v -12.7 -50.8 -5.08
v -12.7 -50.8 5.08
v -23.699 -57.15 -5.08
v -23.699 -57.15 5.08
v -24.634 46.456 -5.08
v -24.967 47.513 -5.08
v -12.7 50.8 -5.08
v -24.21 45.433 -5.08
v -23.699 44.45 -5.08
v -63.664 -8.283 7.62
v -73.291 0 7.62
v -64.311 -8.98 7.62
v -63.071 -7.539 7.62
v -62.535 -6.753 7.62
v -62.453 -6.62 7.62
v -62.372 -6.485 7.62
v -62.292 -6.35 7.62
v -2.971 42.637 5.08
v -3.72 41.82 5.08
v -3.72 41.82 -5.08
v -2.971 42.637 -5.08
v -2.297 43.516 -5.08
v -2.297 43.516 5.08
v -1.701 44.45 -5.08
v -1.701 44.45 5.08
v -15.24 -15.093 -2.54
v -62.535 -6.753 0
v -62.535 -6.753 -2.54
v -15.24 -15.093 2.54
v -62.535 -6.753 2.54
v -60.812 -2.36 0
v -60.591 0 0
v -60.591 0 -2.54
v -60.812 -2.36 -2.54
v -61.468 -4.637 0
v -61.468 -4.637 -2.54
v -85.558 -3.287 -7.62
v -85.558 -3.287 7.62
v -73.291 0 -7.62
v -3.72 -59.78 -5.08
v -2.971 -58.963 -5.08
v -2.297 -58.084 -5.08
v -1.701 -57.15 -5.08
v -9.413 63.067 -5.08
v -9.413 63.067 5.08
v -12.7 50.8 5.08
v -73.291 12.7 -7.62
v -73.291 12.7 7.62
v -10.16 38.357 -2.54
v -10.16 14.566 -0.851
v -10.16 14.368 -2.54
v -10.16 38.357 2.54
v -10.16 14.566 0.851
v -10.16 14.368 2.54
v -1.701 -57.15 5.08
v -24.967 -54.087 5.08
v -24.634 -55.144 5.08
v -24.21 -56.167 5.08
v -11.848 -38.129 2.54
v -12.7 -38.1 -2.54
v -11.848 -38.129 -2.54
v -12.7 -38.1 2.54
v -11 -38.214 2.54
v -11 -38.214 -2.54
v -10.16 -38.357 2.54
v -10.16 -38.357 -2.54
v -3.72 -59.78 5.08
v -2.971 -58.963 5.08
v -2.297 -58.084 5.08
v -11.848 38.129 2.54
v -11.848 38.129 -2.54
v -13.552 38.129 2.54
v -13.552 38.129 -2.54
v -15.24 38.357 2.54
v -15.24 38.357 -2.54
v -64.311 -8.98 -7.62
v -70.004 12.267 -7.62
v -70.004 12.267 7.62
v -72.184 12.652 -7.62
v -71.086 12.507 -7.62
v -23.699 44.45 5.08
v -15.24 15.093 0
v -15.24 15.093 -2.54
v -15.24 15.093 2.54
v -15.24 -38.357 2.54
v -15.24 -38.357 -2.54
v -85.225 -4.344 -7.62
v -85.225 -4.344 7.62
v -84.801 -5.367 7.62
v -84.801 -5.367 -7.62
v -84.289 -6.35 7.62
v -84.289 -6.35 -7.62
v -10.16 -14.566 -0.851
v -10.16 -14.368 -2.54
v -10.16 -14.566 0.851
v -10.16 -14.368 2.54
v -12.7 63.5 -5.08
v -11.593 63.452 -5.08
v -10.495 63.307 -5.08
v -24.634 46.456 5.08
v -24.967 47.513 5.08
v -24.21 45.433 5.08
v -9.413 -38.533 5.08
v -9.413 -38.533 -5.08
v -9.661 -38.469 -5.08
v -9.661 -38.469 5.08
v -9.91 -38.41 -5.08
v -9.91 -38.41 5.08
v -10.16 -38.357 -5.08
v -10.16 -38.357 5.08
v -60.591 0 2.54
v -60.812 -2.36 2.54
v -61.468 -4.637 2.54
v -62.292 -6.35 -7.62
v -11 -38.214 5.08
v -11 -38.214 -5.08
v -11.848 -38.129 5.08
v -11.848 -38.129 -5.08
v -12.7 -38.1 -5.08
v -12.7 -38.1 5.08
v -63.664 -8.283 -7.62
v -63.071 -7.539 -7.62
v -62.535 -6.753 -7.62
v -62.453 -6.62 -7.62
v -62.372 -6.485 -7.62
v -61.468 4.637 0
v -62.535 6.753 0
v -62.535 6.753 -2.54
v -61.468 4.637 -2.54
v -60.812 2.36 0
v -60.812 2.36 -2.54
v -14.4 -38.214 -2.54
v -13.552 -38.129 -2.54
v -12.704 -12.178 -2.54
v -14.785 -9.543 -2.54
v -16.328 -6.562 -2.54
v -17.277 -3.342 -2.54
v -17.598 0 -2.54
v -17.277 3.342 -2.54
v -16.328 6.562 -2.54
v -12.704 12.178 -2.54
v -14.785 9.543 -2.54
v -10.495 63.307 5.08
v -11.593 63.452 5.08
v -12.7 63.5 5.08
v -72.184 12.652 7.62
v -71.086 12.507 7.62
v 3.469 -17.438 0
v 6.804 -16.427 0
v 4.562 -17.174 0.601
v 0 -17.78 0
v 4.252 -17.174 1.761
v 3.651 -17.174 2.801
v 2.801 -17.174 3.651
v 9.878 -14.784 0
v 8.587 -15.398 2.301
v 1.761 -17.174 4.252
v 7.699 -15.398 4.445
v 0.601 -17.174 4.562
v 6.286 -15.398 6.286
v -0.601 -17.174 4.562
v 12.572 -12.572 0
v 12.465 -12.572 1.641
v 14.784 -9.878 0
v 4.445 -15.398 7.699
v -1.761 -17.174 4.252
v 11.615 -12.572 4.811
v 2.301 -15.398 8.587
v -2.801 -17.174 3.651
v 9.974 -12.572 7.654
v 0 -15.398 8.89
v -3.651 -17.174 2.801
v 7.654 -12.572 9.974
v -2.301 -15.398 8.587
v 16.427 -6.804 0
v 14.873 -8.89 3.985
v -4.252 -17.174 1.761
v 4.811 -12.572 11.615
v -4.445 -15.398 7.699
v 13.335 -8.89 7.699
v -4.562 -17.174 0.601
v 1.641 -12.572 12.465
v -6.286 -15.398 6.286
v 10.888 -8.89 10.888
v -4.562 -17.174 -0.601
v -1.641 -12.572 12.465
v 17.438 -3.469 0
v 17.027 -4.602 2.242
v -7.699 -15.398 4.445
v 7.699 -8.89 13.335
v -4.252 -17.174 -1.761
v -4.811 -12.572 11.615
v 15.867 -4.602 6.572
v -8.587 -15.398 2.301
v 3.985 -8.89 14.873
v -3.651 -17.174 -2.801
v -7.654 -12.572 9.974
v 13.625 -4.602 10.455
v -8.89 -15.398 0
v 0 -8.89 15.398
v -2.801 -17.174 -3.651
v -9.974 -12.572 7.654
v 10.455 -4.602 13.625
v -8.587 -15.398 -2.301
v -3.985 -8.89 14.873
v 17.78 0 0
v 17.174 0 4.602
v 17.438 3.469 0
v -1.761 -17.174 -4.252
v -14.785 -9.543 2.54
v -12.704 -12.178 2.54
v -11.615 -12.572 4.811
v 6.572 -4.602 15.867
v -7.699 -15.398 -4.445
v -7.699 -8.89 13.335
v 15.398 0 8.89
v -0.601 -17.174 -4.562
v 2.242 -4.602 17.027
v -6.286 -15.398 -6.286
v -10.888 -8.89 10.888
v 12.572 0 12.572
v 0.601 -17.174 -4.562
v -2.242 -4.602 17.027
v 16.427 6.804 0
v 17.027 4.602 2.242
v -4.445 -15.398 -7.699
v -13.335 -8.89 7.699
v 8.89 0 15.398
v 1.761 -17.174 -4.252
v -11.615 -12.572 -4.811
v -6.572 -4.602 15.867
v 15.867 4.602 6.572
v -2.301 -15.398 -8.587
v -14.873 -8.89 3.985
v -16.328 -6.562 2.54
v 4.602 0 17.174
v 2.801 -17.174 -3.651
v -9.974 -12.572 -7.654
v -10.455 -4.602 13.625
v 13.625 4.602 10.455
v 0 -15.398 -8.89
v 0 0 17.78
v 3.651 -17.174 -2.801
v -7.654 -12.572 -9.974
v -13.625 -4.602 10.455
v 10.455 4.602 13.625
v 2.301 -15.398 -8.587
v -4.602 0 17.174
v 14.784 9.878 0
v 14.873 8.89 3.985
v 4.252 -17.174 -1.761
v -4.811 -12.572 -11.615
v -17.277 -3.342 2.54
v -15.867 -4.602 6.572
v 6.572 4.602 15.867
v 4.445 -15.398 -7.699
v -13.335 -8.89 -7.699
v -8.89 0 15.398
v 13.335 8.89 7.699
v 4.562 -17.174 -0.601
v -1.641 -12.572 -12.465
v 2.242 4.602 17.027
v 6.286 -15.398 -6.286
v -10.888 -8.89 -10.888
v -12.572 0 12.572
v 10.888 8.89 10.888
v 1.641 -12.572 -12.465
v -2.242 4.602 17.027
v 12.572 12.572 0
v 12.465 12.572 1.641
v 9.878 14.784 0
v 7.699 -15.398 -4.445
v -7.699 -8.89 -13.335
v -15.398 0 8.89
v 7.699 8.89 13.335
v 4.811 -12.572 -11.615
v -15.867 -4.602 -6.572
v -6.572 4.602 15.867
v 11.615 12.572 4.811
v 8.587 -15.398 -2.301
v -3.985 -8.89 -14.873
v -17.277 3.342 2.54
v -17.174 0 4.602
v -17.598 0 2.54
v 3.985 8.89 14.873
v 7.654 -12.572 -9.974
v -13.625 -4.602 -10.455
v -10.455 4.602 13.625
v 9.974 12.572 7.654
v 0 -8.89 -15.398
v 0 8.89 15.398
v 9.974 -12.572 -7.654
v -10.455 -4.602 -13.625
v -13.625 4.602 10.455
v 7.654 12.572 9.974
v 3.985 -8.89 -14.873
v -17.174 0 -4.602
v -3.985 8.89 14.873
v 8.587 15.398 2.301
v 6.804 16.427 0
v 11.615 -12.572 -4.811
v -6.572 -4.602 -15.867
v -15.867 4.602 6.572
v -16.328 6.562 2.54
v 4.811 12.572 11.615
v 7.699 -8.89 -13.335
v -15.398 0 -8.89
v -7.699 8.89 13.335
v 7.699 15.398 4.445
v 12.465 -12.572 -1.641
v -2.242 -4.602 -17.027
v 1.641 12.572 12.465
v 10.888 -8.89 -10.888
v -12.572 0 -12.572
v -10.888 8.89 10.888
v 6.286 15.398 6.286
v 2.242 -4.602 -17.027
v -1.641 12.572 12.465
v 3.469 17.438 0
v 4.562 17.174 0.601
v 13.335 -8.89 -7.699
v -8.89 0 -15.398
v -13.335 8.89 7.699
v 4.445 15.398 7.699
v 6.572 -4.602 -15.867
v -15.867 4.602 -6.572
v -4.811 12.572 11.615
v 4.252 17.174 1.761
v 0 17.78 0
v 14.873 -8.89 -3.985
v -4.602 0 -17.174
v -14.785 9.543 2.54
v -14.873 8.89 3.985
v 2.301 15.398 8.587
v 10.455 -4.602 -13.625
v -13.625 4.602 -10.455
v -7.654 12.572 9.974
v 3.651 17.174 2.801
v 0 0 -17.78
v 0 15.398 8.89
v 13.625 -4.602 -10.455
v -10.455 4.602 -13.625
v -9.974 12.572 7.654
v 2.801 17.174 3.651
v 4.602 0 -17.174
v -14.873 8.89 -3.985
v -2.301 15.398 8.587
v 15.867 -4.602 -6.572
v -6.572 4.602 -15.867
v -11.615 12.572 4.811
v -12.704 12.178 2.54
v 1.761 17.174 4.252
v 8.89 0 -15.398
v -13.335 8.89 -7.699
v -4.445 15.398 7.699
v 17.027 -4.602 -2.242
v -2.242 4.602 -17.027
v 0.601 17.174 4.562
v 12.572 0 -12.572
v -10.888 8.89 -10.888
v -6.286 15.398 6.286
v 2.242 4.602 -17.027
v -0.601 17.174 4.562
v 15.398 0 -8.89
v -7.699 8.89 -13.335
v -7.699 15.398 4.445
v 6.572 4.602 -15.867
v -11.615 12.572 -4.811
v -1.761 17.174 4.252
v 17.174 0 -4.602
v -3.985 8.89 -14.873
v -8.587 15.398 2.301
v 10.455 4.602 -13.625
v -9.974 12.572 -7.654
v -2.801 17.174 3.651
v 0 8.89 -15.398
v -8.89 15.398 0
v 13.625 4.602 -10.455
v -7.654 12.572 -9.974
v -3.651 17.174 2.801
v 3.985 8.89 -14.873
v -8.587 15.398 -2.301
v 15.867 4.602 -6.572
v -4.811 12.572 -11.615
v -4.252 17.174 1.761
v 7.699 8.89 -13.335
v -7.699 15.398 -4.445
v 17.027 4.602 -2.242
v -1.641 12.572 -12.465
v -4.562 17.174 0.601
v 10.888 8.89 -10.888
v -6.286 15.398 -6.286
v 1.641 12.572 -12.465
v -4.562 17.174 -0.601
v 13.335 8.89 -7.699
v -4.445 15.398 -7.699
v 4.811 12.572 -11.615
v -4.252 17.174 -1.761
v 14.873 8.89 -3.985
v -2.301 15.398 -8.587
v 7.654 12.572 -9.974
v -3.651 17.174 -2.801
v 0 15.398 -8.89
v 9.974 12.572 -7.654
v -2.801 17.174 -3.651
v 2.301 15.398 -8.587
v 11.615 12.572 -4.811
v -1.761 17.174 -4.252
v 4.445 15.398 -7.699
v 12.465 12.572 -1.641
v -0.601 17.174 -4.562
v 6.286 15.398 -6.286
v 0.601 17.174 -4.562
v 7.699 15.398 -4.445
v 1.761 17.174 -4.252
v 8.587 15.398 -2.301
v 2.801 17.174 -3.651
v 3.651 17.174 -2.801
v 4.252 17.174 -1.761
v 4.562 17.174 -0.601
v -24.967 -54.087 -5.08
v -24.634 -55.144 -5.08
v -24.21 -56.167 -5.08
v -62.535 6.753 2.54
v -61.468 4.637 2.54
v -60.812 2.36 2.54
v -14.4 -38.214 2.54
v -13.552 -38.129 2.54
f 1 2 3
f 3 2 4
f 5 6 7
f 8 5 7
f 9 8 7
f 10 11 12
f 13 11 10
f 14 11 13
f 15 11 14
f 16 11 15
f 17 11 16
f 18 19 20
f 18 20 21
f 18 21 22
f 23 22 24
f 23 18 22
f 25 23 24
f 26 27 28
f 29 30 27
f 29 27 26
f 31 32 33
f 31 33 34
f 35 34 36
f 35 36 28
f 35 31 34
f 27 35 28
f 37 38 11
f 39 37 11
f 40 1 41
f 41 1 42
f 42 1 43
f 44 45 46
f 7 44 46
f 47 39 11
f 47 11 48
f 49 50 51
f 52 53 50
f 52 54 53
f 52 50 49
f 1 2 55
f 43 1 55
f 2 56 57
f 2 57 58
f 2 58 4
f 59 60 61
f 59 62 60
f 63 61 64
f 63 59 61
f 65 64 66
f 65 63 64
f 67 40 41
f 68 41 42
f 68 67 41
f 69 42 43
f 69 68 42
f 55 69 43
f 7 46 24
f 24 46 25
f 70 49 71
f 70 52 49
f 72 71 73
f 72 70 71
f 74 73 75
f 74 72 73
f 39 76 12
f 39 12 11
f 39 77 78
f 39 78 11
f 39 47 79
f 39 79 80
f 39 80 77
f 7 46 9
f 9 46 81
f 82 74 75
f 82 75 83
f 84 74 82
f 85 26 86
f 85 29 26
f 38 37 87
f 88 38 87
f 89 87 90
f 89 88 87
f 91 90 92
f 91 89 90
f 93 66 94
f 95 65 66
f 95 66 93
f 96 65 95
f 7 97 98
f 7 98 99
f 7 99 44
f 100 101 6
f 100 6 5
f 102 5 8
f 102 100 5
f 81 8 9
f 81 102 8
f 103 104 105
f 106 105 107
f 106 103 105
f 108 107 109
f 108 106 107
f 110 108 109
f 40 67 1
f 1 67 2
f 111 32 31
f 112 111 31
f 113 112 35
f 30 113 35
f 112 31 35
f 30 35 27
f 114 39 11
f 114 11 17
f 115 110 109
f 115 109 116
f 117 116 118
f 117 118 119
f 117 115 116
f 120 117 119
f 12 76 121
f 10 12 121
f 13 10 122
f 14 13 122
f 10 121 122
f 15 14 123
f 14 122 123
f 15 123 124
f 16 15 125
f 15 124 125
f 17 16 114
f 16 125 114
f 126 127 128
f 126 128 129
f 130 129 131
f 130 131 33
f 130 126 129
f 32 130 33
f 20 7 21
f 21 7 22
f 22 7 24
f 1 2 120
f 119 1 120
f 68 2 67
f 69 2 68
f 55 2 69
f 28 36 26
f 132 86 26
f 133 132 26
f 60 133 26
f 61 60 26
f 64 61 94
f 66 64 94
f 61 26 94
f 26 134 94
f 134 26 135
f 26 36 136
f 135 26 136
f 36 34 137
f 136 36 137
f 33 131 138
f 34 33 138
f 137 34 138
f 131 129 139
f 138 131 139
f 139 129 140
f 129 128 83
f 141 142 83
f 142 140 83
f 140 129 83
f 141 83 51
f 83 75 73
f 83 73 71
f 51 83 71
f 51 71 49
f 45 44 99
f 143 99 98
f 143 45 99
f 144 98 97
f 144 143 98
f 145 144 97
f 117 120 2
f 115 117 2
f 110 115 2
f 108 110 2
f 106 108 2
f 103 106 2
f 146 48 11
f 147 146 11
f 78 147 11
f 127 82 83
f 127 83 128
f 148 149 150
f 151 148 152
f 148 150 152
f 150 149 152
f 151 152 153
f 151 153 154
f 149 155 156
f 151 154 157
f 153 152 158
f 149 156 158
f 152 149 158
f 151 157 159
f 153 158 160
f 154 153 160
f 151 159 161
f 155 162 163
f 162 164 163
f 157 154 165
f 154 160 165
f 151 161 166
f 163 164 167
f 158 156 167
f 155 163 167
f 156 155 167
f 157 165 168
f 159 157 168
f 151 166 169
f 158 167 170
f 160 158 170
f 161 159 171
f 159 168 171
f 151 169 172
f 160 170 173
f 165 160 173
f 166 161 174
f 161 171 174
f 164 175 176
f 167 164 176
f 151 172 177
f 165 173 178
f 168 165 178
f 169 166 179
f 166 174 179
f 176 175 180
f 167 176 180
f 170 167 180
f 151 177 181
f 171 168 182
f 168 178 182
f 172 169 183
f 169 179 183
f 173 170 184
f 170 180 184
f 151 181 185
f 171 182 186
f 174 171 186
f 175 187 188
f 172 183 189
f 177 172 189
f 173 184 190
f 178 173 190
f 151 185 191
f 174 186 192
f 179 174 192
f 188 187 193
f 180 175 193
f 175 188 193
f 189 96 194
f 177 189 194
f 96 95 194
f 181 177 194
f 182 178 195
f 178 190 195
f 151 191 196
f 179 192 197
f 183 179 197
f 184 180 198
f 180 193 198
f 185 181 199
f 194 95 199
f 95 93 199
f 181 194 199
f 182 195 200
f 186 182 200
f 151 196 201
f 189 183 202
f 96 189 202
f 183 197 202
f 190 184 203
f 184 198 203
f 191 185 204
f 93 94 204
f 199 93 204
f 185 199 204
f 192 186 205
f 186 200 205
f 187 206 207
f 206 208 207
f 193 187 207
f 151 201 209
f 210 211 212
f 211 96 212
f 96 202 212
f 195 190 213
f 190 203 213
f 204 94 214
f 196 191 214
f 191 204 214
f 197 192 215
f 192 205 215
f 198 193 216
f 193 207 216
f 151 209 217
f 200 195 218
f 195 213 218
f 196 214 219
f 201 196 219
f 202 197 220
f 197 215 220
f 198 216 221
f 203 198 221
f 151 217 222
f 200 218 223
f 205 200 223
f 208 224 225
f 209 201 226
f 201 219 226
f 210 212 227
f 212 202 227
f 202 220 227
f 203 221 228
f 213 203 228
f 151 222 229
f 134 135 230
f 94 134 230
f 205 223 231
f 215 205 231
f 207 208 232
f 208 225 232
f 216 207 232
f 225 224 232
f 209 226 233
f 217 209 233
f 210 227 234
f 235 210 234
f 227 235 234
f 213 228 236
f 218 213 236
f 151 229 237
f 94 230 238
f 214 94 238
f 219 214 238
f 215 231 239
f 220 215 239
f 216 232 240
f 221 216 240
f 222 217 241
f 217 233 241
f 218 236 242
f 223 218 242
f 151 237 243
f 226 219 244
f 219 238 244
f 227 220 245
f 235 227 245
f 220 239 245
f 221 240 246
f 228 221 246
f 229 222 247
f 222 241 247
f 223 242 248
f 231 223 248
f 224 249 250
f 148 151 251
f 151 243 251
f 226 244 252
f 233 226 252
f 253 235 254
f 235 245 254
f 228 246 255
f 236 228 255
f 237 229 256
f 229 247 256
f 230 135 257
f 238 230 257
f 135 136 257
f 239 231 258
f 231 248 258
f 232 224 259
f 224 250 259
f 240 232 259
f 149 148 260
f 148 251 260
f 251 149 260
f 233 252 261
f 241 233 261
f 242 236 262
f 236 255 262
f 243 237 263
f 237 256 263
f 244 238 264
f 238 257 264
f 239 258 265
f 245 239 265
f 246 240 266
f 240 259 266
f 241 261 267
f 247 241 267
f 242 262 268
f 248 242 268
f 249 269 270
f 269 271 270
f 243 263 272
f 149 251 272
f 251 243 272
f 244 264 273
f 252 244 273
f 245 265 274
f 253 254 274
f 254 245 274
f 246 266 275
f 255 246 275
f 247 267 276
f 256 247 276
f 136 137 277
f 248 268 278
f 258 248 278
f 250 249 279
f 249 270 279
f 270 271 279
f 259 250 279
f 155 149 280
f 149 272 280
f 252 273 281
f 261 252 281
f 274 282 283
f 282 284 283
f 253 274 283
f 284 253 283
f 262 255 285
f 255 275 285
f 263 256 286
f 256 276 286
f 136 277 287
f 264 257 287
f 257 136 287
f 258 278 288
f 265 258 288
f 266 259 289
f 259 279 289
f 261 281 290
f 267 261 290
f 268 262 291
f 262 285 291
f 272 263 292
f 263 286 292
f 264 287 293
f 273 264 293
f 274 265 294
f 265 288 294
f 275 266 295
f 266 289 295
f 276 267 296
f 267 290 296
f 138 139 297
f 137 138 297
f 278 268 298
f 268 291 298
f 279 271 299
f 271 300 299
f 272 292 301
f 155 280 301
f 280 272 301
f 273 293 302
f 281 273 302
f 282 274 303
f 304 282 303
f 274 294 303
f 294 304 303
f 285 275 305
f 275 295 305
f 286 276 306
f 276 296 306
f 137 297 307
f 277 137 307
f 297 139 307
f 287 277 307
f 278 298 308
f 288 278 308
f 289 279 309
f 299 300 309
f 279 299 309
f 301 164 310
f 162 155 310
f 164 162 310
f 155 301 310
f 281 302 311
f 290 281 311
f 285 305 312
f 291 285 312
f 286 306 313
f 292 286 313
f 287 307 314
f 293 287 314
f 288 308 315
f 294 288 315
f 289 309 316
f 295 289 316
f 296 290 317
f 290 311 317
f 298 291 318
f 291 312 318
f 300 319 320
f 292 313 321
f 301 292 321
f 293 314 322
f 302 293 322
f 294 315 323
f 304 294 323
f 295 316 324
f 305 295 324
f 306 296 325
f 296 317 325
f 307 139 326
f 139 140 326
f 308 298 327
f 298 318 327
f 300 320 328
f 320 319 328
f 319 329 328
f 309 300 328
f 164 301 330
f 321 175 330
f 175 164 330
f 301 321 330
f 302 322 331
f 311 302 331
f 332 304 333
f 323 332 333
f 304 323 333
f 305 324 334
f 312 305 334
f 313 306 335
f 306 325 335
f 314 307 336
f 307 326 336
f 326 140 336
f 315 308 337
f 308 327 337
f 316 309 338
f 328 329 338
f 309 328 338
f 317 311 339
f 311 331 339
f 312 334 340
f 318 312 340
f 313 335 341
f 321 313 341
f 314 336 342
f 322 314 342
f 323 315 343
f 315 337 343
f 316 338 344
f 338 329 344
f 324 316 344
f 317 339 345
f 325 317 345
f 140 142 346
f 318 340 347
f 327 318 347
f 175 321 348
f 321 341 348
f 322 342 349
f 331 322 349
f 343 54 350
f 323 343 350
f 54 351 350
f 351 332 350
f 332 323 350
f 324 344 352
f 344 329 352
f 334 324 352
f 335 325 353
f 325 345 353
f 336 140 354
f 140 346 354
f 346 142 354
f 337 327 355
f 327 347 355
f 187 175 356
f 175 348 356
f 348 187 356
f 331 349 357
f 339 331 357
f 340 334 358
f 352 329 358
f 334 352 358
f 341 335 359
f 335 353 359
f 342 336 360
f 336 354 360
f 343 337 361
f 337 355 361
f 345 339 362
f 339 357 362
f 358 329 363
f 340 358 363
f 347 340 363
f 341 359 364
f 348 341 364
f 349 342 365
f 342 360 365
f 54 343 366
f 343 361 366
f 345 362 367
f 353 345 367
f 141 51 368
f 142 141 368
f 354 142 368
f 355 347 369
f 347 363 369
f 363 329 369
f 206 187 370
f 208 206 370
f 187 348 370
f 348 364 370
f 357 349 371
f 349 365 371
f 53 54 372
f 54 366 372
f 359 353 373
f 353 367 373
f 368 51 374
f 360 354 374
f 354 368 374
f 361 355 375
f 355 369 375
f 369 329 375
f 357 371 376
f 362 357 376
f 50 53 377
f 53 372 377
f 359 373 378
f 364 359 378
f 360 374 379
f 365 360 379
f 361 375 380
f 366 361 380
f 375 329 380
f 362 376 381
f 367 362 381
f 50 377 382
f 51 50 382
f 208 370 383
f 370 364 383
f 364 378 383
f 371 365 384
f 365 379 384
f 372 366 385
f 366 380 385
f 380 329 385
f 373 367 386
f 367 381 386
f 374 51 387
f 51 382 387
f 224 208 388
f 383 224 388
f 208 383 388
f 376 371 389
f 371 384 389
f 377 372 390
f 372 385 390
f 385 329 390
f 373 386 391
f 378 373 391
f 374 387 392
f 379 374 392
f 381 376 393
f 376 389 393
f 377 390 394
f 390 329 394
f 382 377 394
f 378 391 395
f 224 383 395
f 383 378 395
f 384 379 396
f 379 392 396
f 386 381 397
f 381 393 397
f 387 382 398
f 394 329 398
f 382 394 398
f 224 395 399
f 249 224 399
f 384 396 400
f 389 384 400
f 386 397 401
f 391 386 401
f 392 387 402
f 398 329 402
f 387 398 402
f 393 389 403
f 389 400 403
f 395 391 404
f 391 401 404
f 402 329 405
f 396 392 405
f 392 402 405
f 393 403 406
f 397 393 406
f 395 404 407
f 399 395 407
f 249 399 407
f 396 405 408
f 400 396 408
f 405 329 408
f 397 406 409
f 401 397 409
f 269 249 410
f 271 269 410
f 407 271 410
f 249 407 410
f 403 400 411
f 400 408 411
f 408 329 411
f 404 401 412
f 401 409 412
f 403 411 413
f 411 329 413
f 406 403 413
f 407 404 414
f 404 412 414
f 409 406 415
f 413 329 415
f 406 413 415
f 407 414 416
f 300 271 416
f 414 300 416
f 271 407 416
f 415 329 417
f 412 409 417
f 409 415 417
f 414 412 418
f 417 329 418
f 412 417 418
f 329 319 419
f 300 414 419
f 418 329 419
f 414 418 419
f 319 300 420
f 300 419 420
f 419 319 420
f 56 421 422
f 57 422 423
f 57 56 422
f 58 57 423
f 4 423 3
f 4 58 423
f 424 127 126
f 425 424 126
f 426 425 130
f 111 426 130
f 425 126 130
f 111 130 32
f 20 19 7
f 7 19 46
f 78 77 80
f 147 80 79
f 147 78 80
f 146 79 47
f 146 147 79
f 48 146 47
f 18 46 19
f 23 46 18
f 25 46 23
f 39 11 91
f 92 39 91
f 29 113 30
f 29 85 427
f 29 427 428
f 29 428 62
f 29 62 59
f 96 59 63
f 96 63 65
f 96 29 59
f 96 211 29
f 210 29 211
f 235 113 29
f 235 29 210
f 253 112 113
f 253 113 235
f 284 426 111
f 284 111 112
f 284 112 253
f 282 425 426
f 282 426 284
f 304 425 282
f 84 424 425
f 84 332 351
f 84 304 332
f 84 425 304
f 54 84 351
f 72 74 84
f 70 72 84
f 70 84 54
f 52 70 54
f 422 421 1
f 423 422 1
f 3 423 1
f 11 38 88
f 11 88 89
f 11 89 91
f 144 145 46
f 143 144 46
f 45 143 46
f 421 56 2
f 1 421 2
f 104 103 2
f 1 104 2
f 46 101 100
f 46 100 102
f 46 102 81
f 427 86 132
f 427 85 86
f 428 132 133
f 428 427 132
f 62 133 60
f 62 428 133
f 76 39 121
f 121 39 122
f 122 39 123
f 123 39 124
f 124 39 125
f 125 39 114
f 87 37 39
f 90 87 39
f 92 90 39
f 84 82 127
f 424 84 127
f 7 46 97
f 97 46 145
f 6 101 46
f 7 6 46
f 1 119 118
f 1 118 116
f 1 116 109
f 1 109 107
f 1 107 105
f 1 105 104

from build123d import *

# Parameters (mm, degrees)
F2_DEPTH  = 2.54
F3_DEPTH  = 5.08
F4_DEPTH  = 7.62
F8_DEPTH  = 25.4
F10_DEPTH = 22.861
F12_DEPTH = 25.401


# Not quite as in the source:
# - the program builds the solid bodies; features that only make, move or delete a surface that nothing else refers to are left out


with BuildPart() as f1:
    # F0 (on Top) → F1 (revolve)
    with BuildSketch(Plane.XY):
        with BuildLine():
            Line((0, 0), (0, -17.78))
            ThreePointArc((0, -17.78), (17.78, 0), (0, 17.78))
            Line((0, 17.78), (0, 0))
        make_face()
    revolve(axis=Axis((0, -8.89, 0), (0, -1, 0)))

    # F0 (on Top) → F2 (join, symmetric)
    with BuildSketch(Plane.XY):
        with BuildLine():
            Line((-15.24, 15.092776814), (-10.16, 15.988517876))
            Line((-10.16, 15.988517876), (-10.16, 38.3565921067))
            ThreePointArc((-10.16, 38.3565921067), (-12.7, 38.1), (-15.24, 38.3565921067))
            Line((-15.24, 38.3565921067), (-15.24, 15.092776814))
        make_face()
        Polygon((-15.24, -15.092776814), (-10.16, -15.988517876), (-10.16, 0), (-10.16, 15.988517876), (-15.24, 15.092776814), (-15.24, 0), align=None)
        with BuildLine():
            Line((-62.5352923163, -6.7533407181), (-15.24, -15.092776814))
            Line((-15.24, -15.092776814), (-15.24, 0))
            Line((-15.24, 0), (-15.24, 15.092776814))
            Line((-15.24, 15.092776814), (-62.5352923163, 6.7533407181))
            ThreePointArc((-62.5352923163, 6.7533407181), (-61.086650628, 3.5138440574), (-60.5908671101, 0))
            ThreePointArc((-60.5908671101, 0), (-61.086650628, -3.5138440574), (-62.5352923163, -6.7533407181))
        make_face()
        with BuildLine():
            Line((-10.16, -38.3565921067), (-10.16, -15.988517876))
            Line((-10.16, -15.988517876), (-15.24, -15.092776814))
            Line((-15.24, -15.092776814), (-15.24, -38.3565921067))
            ThreePointArc((-15.24, -38.3565921067), (-13.9764638175, -38.1643108568), (-12.7, -38.1))
            ThreePointArc((-12.7, -38.1), (-11.4235361825, -38.1643108568), (-10.16, -38.3565921067))
        make_face()
    extrude(amount=F2_DEPTH, both=True)


with BuildPart() as f3:
    # F0 (on Top) → F3 (new body, symmetric)
    with BuildSketch(Plane.XY):
        with BuildLine():
            Line((-10.16, 47.2073256969), (-10.16, 38.3565921067))
            ThreePointArc((-10.16, 38.3565921067), (-2.8626223006, 42.7678147432), (0, 50.8))
            ThreePointArc((0, 50.8), (-20.7321852568, 60.6373776994), (-15.24, 38.3565921067))
            Line((-15.24, 38.3565921067), (-15.24, 46.6368459165))
            Line((-15.24, 46.6368459165), (-10.16, 47.2073256969))
        make_face()
        with BuildLine():
            ThreePointArc((-15.24, 38.3565921067), (-12.7, 38.1), (-10.16, 38.3565921067))
            Line((-10.16, 38.3565921067), (-10.16, 47.2073256969))
            Line((-10.16, 47.2073256969), (-15.24, 46.6368459165))
            Line((-15.24, 46.6368459165), (-15.24, 38.3565921067))
        make_face()
    extrude(amount=F3_DEPTH, both=True)

    # F7 (on face) → F8 (cut)
    with BuildSketch(Plane.XY.offset(5.08)):
        with BuildLine():
            Line((-9.4129981272, 63.0672579939), (-12.7, 50.8))
            Line((-12.7, 50.8), (-1.7014773719, 44.45))
            ThreePointArc((-1.7014773719, 44.45), (-0.4327420061, 47.5129981272), (0, 50.8))
            ThreePointArc((0, 50.8), (-2.6244125783, 58.5312701484), (-9.4129981272, 63.0672579939))
        make_face()
        with BuildLine():
            Line((-24.9672579939, 47.5129981272), (-12.7, 50.8))
            Line((-12.7, 50.8), (-12.7, 63.5))
            ThreePointArc((-12.7, 63.5), (-22.7755874217, 58.5312701484), (-24.9672579939, 47.5129981272))
        make_face()
        with BuildLine():
            Line((-3.7197438789, 41.8197438789), (-12.7, 50.8))
            Line((-12.7, 50.8), (-23.6985226281, 44.45))
            ThreePointArc((-23.6985226281, 44.45), (-14.3576826412, 38.2086502606), (-3.7197438789, 41.8197438789))
        make_face()
    extrude(amount=-F8_DEPTH, mode=Mode.SUBTRACT)


with BuildPart() as f3b:
    # F0 (on Top) → F3, piece 2 (new body, symmetric)
    with BuildSketch(Plane.XY):
        with BuildLine():
            ThreePointArc((0, -50.8), (-2.8626223006, -42.7678147432), (-10.16, -38.3565921067))
            Line((-10.16, -38.3565921067), (-10.16, -45.2106446028))
            Line((-10.16, -45.2106446028), (-12.7, -44.8303223014))
            Line((-12.7, -44.8303223014), (-15.24, -44.45))
            Line((-15.24, -44.45), (-15.24, -38.3565921067))
            ThreePointArc((-15.24, -38.3565921067), (-20.7321852568, -60.6373776994), (0, -50.8))
        make_face()
        with BuildLine():
            ThreePointArc((-12.7, -38.1), (-13.9764638175, -38.1643108568), (-15.24, -38.3565921067))
            Line((-15.24, -38.3565921067), (-15.24, -44.45))
            Line((-15.24, -44.45), (-12.7, -44.8303223014))
            Line((-12.7, -44.8303223014), (-12.7, -38.1))
        make_face()
        with BuildLine():
            Line((-10.16, -45.2106446028), (-10.16, -38.3565921067))
            ThreePointArc((-10.16, -38.3565921067), (-11.4235361825, -38.1643108568), (-12.7, -38.1))
            Line((-12.7, -38.1), (-12.7, -44.8303223014))
            Line((-12.7, -44.8303223014), (-10.16, -45.2106446028))
        make_face()
    extrude(amount=F3_DEPTH, both=True)

    # F6 (on face) → F10 (cut, through all)
    with BuildSketch(Plane.XY.offset(5.08)):
        with BuildLine():
            Line((-9.4129981272, -38.5327420061), (-12.7, -50.8))
            Line((-12.7, -50.8), (-1.7014773719, -57.15))
            ThreePointArc((-1.7014773719, -57.15), (-0.4327420061, -54.0870018728), (0, -50.8))
            ThreePointArc((0, -50.8), (-2.6244125783, -43.0687298516), (-9.4129981272, -38.5327420061))
        make_face()
        with BuildLine():
            Line((-24.9672579939, -54.0870018728), (-12.7, -50.8))
            Line((-12.7, -50.8), (-12.7, -38.1))
            ThreePointArc((-12.7, -38.1), (-22.7755874217, -43.0687298516), (-24.9672579939, -54.0870018728))
        make_face()
        with BuildLine():
            Line((-3.7197438789, -59.7802561211), (-12.7, -50.8))
            Line((-12.7, -50.8), (-23.6985226281, -57.15))
            ThreePointArc((-23.6985226281, -57.15), (-14.3576826412, -63.3913497394), (-3.7197438789, -59.7802561211))
        make_face()
    extrude(amount=-F10_DEPTH, mode=Mode.SUBTRACT)


with BuildPart() as f4:
    # F0 (on Top) → F4 (new body, symmetric)
    with BuildSketch(Plane.XY):
        with BuildLine():
            ThreePointArc((-62.5352923163, 6.7533407181), (-85.9908671101, 0), (-62.5352923163, -6.7533407181))
            ThreePointArc((-62.5352923163, -6.7533407181), (-61.086650628, -3.5138440574), (-60.5908671101, 0))
            ThreePointArc((-60.5908671101, 0), (-61.086650628, 3.5138440574), (-62.5352923163, 6.7533407181))
        make_face()
    extrude(amount=F4_DEPTH, both=True)

    # F5 (on face) → F12 (cut, through all)
    with BuildSketch(Plane.XY.offset(7.62)):
        with BuildLine():
            Line((-85.5581251039, -3.2870018728), (-73.2908671101, 0))
            Line((-73.2908671101, 0), (-73.2908671101, 12.7))
            ThreePointArc((-73.2908671101, 12.7), (-83.3664545318, 7.7312701484), (-85.5581251039, -3.2870018728))
        make_face()
        with BuildLine():
            Line((-70.0038652373, 12.2672579939), (-73.2908671101, 0))
            Line((-73.2908671101, 0), (-62.292344482, -6.35))
            ThreePointArc((-62.292344482, -6.35), (-61.0236091162, -3.2870018728), (-60.5908671101, 0))
            ThreePointArc((-60.5908671101, 0), (-61.086650628, 3.5138440574), (-62.5352923163, 6.7533407181))
            ThreePointArc((-62.5352923163, 6.7533407181), (-65.7477039281, 10.2171761857), (-70.0038652373, 12.2672579939))
        make_face()
        with BuildLine():
            Line((-64.310610989, -8.9802561211), (-73.2908671101, 0))
            Line((-73.2908671101, 0), (-84.2893897381, -6.35))
            ThreePointArc((-84.2893897381, -6.35), (-74.9485497512, -12.5913497394), (-64.310610989, -8.9802561211))
        make_face()
    extrude(amount=-F12_DEPTH, mode=Mode.SUBTRACT)


solid = Compound([f1.part, f3.part, f3b.part, f4.part])
